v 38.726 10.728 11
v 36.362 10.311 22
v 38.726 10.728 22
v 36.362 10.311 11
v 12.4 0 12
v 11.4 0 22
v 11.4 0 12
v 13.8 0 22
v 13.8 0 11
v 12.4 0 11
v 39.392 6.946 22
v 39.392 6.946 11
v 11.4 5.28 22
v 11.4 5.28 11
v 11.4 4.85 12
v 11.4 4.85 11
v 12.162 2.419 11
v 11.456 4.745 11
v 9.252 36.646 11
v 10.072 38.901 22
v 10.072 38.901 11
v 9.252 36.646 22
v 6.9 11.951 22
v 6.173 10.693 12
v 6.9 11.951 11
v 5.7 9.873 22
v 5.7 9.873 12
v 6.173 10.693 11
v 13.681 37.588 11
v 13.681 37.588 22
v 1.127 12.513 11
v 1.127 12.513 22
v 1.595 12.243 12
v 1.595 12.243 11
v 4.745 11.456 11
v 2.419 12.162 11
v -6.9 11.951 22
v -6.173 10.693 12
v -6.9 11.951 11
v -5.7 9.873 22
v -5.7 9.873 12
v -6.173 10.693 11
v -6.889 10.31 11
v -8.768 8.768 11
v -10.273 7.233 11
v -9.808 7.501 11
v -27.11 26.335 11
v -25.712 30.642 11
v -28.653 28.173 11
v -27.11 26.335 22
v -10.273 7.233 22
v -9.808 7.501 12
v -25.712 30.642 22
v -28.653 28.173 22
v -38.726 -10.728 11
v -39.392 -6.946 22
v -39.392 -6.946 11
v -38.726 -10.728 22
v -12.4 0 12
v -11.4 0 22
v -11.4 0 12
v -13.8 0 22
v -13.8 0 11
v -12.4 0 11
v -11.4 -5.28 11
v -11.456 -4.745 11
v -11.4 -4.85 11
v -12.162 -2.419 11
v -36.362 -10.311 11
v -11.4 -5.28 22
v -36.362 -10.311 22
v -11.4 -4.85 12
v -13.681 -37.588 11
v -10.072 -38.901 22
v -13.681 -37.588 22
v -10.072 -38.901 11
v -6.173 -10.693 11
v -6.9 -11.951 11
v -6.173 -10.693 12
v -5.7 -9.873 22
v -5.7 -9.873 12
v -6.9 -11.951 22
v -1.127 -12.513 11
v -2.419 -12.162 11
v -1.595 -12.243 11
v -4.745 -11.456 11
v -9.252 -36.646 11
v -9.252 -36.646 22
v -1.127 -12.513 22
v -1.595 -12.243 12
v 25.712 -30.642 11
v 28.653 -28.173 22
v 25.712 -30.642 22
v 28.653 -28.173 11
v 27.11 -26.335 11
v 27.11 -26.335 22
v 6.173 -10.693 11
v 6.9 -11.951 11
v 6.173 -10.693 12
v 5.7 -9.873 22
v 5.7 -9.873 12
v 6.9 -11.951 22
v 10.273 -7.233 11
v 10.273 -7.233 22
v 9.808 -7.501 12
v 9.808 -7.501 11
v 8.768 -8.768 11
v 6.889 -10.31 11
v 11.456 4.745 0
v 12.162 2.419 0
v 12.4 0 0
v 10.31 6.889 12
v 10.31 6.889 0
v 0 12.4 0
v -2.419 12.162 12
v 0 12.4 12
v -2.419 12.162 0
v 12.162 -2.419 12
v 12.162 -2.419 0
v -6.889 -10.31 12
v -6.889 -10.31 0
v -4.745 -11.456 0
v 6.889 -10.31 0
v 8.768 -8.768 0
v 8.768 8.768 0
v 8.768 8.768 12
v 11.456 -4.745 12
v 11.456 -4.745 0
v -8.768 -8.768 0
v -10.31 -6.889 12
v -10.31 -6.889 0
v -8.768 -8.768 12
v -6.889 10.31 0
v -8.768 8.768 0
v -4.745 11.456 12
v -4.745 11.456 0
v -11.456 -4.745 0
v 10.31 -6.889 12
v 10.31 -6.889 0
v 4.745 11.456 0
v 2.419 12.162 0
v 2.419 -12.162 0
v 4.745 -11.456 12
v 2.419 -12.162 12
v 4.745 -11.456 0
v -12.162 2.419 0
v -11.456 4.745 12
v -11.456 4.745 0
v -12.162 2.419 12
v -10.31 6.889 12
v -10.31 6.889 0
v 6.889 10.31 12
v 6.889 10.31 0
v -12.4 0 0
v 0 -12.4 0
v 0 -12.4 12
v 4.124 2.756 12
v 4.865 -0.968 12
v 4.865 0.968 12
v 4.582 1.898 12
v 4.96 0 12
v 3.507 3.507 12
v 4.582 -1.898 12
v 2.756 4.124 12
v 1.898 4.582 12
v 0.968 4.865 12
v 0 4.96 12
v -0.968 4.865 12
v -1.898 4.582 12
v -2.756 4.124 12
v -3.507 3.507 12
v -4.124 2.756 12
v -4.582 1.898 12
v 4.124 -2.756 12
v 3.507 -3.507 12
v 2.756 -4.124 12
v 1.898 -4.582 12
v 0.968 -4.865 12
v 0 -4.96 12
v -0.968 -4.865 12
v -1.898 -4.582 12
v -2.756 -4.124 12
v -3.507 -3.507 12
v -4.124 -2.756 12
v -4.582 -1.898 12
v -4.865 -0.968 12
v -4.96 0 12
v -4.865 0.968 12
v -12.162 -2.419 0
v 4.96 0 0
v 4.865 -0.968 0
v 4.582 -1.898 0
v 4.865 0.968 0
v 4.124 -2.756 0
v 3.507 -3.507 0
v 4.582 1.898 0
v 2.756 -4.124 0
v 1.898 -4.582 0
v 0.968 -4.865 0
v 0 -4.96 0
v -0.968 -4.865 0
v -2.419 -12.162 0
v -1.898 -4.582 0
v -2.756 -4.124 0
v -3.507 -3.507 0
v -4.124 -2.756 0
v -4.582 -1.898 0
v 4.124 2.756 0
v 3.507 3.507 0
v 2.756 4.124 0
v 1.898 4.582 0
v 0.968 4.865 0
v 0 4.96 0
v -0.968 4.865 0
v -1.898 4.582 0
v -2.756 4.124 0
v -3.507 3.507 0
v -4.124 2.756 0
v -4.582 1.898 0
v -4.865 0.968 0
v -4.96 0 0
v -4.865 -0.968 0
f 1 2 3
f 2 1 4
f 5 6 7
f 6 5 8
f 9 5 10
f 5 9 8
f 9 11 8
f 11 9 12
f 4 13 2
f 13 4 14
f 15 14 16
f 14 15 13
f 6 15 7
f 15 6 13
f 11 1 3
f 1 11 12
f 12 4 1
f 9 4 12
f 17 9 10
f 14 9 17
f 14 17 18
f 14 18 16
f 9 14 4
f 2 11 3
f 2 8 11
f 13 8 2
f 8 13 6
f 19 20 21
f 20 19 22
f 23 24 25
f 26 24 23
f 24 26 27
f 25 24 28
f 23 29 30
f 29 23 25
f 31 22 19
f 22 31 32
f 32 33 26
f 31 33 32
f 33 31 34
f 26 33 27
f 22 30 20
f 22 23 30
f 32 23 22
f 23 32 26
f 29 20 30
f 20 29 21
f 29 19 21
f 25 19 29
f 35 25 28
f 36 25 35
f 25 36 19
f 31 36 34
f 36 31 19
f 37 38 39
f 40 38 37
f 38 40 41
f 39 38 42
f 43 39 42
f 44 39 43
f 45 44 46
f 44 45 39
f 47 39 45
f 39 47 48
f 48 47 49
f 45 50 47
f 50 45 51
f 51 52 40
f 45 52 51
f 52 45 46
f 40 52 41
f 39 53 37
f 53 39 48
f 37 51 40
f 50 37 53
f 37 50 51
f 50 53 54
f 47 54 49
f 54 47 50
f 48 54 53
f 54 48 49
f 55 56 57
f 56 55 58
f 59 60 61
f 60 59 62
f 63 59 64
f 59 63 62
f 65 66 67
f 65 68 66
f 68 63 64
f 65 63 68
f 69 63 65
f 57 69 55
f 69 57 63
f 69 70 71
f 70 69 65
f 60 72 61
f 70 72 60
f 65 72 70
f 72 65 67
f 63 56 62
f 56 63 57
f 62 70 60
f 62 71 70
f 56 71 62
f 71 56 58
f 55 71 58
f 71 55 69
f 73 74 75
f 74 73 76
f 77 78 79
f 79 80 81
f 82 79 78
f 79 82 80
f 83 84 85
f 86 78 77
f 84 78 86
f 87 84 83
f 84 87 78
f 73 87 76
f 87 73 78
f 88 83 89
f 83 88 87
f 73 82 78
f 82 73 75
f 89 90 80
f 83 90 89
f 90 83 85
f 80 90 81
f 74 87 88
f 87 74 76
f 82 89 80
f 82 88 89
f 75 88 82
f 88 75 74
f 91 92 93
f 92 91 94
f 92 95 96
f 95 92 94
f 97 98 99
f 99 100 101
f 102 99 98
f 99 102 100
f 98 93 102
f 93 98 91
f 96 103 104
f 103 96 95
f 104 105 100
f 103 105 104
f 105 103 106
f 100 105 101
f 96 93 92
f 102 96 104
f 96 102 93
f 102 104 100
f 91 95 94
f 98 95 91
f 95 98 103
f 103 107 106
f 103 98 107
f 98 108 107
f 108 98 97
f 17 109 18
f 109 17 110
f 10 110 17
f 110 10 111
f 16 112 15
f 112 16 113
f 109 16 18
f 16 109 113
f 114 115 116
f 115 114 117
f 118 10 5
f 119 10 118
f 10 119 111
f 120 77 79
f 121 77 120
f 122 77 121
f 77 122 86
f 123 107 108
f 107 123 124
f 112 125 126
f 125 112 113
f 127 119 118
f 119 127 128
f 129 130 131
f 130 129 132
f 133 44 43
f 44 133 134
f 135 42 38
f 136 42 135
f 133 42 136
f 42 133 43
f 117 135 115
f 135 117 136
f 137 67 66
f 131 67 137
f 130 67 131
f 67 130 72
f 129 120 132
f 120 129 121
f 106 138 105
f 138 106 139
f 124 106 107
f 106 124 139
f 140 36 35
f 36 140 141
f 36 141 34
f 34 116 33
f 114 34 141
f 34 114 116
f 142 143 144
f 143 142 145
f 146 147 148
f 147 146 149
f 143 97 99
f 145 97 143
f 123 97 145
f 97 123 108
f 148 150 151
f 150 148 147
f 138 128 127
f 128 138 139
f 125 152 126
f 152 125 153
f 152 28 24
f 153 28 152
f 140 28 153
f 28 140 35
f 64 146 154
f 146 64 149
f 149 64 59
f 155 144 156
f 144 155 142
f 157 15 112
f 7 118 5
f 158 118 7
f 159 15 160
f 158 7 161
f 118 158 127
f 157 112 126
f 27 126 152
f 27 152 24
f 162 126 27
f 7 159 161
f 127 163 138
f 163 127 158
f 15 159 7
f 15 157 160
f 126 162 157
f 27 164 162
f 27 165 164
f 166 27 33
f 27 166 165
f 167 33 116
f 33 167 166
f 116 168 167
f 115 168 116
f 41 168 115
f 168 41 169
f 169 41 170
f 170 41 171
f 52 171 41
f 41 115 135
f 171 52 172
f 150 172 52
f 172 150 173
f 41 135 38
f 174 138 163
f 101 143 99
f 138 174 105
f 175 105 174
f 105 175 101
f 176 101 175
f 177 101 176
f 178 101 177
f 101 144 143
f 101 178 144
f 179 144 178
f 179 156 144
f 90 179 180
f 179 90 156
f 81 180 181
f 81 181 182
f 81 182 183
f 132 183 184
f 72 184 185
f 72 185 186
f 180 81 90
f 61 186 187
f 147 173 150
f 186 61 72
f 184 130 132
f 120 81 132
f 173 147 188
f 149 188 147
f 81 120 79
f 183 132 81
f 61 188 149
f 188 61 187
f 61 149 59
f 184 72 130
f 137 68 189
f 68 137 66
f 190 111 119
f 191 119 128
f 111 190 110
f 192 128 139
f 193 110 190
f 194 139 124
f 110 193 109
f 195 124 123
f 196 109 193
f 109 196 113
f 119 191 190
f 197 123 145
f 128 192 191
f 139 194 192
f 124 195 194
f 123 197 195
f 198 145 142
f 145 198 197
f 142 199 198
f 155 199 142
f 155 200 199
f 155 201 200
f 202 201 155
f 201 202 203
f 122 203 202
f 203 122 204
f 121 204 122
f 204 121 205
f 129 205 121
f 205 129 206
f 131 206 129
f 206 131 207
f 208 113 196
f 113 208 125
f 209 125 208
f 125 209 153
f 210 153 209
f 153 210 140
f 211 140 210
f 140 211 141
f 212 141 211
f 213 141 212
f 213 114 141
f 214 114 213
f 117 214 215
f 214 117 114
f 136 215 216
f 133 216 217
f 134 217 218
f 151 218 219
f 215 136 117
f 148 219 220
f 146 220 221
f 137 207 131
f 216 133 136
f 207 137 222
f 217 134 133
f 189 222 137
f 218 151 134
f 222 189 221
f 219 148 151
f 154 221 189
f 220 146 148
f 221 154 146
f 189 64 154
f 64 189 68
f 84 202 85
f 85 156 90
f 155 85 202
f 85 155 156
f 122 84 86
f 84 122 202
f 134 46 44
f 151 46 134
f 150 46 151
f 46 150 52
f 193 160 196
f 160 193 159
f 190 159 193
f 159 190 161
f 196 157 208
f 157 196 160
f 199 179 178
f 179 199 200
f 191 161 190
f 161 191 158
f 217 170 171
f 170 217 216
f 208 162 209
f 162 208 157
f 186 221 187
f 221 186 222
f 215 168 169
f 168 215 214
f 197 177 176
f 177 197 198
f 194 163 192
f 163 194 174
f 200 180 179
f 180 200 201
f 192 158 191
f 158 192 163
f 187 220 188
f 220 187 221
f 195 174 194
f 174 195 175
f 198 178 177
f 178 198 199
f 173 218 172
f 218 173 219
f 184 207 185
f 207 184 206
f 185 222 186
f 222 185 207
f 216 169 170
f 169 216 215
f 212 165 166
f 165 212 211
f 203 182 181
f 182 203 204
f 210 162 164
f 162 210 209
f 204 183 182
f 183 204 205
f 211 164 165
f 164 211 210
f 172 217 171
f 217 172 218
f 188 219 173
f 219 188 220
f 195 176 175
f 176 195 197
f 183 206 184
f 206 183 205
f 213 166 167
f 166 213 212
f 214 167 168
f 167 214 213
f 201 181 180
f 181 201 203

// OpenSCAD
$fn = 32;

// ----------------------------------------------------------------------
// Impeller: 80 mm, 6 blades, 22 mm tall
// ----------------------------------------------------------------------

// --- parameters (mm) ---
boss_d = 24.8;            // hub diameter
boss_h = 12;              // hub height
rotor_d = 80;             // outer diameter over the blades
vane_count = 6;           // number of blades
blade_t = 2.4;            // blade thickness
blade_h = 10;             // blade height
blade_in_r = 11.4;        // blade root radius
blade_out_r = 37.6;       // blade tip radius
sweep = 10;               // blade sweep, degrees
bore_d = 9.92;            // shaft bore

module hub() {
  cylinder(h = boss_h, d = boss_d);
}

module blade() {
  /* blade swept between two boxes: hull of the root and the tip section */
  hull() {
    translate([blade_in_r, 0, boss_h - 1])
      cube([blade_t, blade_t * 2.2, blade_h + 1], center = false);
    rotate([0, 0, sweep])
      translate([blade_out_r, 0, boss_h - 1])
        cube([blade_t, blade_t * 1.6, blade_h + 1], center = false);
  }
}

module blades() {
  for (i = [0 : vane_count - 1])
    rotate([0, 0, i * 360 / vane_count]) blade();
}

difference() {
  union() {
    hub();
    blades();
  }
  translate([0, 0, -1]) cylinder(h = boss_h + blade_h + 0 + 3, d = bore_d);
}
